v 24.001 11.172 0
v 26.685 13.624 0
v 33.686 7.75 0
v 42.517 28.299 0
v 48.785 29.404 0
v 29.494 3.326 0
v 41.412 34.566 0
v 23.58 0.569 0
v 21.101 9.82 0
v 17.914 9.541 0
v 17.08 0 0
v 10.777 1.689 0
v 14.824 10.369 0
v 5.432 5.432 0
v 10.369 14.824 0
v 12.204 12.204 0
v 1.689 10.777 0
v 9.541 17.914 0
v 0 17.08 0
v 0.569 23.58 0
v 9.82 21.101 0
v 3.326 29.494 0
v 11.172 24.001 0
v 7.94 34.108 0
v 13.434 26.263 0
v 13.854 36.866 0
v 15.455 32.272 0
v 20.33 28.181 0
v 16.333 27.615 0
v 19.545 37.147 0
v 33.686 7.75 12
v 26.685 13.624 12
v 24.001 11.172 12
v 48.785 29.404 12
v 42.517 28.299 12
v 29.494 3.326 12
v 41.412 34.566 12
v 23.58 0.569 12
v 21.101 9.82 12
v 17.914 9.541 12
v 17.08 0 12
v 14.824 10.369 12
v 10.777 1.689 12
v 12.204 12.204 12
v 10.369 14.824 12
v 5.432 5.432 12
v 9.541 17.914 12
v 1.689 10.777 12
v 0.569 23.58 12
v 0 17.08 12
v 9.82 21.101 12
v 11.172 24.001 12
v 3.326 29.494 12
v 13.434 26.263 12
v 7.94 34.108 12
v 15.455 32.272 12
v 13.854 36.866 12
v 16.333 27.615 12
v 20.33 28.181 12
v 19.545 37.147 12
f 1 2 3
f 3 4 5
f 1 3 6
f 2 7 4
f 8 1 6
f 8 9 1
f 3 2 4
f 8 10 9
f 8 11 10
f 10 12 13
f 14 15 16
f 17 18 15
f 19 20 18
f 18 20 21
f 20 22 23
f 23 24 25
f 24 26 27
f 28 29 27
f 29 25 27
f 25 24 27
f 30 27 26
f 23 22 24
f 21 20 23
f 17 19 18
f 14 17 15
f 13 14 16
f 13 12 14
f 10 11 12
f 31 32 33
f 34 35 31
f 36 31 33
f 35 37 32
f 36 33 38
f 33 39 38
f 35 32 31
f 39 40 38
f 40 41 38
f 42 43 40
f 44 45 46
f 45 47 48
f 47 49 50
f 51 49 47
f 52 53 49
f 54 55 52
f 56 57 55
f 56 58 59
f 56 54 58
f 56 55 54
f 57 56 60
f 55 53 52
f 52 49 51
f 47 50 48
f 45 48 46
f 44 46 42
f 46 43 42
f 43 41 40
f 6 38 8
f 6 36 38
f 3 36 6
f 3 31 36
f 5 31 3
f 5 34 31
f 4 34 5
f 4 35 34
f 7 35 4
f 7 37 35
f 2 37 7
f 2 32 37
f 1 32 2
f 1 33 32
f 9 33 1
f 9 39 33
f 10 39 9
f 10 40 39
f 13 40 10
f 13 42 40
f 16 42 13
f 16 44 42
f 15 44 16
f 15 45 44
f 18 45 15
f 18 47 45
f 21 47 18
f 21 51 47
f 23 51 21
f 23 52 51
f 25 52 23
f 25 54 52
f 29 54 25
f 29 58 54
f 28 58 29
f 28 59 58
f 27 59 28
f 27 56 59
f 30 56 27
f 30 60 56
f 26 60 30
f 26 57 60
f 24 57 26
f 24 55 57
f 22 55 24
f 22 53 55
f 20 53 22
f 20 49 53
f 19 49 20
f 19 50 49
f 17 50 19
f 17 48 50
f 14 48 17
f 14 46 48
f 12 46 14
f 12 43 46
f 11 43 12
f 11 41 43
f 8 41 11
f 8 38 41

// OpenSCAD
$fn = 32;

// ----------------------------------------------------------------------
// Eye lug: ring_tail, 12 mm thick
// ----------------------------------------------------------------------

// --- parameters (mm) ---
profile_height = 12;      // extrusion height
profile_points = 30;      // points of the closed outline

profile = [[15.455, 32.272], [19.545, 37.147], [13.854, 36.866], [7.94, 34.108], [3.326, 29.494], [0.569, 23.58], [0, 17.08], [1.689, 10.777], [5.432, 5.432], [10.777, 1.689], [17.08, 0], [23.58, 0.569], [29.494, 3.326], [33.686, 7.75], [48.785, 29.404], [42.517, 28.299], [41.412, 34.566], [26.685, 13.624], [24.001, 11.172], [21.101, 9.82], [17.914, 9.541], [14.824, 10.369], [12.204, 12.204], [10.369, 14.824], [9.541, 17.914], [9.82, 21.101], [11.172, 24.001], [13.434, 26.263], [16.333, 27.615], [20.33, 28.181]];  // single closed polygon, 30 points, counter clockwise

// --- the one profile operation ---
linear_extrude(height = profile_height) polygon(points = profile);
